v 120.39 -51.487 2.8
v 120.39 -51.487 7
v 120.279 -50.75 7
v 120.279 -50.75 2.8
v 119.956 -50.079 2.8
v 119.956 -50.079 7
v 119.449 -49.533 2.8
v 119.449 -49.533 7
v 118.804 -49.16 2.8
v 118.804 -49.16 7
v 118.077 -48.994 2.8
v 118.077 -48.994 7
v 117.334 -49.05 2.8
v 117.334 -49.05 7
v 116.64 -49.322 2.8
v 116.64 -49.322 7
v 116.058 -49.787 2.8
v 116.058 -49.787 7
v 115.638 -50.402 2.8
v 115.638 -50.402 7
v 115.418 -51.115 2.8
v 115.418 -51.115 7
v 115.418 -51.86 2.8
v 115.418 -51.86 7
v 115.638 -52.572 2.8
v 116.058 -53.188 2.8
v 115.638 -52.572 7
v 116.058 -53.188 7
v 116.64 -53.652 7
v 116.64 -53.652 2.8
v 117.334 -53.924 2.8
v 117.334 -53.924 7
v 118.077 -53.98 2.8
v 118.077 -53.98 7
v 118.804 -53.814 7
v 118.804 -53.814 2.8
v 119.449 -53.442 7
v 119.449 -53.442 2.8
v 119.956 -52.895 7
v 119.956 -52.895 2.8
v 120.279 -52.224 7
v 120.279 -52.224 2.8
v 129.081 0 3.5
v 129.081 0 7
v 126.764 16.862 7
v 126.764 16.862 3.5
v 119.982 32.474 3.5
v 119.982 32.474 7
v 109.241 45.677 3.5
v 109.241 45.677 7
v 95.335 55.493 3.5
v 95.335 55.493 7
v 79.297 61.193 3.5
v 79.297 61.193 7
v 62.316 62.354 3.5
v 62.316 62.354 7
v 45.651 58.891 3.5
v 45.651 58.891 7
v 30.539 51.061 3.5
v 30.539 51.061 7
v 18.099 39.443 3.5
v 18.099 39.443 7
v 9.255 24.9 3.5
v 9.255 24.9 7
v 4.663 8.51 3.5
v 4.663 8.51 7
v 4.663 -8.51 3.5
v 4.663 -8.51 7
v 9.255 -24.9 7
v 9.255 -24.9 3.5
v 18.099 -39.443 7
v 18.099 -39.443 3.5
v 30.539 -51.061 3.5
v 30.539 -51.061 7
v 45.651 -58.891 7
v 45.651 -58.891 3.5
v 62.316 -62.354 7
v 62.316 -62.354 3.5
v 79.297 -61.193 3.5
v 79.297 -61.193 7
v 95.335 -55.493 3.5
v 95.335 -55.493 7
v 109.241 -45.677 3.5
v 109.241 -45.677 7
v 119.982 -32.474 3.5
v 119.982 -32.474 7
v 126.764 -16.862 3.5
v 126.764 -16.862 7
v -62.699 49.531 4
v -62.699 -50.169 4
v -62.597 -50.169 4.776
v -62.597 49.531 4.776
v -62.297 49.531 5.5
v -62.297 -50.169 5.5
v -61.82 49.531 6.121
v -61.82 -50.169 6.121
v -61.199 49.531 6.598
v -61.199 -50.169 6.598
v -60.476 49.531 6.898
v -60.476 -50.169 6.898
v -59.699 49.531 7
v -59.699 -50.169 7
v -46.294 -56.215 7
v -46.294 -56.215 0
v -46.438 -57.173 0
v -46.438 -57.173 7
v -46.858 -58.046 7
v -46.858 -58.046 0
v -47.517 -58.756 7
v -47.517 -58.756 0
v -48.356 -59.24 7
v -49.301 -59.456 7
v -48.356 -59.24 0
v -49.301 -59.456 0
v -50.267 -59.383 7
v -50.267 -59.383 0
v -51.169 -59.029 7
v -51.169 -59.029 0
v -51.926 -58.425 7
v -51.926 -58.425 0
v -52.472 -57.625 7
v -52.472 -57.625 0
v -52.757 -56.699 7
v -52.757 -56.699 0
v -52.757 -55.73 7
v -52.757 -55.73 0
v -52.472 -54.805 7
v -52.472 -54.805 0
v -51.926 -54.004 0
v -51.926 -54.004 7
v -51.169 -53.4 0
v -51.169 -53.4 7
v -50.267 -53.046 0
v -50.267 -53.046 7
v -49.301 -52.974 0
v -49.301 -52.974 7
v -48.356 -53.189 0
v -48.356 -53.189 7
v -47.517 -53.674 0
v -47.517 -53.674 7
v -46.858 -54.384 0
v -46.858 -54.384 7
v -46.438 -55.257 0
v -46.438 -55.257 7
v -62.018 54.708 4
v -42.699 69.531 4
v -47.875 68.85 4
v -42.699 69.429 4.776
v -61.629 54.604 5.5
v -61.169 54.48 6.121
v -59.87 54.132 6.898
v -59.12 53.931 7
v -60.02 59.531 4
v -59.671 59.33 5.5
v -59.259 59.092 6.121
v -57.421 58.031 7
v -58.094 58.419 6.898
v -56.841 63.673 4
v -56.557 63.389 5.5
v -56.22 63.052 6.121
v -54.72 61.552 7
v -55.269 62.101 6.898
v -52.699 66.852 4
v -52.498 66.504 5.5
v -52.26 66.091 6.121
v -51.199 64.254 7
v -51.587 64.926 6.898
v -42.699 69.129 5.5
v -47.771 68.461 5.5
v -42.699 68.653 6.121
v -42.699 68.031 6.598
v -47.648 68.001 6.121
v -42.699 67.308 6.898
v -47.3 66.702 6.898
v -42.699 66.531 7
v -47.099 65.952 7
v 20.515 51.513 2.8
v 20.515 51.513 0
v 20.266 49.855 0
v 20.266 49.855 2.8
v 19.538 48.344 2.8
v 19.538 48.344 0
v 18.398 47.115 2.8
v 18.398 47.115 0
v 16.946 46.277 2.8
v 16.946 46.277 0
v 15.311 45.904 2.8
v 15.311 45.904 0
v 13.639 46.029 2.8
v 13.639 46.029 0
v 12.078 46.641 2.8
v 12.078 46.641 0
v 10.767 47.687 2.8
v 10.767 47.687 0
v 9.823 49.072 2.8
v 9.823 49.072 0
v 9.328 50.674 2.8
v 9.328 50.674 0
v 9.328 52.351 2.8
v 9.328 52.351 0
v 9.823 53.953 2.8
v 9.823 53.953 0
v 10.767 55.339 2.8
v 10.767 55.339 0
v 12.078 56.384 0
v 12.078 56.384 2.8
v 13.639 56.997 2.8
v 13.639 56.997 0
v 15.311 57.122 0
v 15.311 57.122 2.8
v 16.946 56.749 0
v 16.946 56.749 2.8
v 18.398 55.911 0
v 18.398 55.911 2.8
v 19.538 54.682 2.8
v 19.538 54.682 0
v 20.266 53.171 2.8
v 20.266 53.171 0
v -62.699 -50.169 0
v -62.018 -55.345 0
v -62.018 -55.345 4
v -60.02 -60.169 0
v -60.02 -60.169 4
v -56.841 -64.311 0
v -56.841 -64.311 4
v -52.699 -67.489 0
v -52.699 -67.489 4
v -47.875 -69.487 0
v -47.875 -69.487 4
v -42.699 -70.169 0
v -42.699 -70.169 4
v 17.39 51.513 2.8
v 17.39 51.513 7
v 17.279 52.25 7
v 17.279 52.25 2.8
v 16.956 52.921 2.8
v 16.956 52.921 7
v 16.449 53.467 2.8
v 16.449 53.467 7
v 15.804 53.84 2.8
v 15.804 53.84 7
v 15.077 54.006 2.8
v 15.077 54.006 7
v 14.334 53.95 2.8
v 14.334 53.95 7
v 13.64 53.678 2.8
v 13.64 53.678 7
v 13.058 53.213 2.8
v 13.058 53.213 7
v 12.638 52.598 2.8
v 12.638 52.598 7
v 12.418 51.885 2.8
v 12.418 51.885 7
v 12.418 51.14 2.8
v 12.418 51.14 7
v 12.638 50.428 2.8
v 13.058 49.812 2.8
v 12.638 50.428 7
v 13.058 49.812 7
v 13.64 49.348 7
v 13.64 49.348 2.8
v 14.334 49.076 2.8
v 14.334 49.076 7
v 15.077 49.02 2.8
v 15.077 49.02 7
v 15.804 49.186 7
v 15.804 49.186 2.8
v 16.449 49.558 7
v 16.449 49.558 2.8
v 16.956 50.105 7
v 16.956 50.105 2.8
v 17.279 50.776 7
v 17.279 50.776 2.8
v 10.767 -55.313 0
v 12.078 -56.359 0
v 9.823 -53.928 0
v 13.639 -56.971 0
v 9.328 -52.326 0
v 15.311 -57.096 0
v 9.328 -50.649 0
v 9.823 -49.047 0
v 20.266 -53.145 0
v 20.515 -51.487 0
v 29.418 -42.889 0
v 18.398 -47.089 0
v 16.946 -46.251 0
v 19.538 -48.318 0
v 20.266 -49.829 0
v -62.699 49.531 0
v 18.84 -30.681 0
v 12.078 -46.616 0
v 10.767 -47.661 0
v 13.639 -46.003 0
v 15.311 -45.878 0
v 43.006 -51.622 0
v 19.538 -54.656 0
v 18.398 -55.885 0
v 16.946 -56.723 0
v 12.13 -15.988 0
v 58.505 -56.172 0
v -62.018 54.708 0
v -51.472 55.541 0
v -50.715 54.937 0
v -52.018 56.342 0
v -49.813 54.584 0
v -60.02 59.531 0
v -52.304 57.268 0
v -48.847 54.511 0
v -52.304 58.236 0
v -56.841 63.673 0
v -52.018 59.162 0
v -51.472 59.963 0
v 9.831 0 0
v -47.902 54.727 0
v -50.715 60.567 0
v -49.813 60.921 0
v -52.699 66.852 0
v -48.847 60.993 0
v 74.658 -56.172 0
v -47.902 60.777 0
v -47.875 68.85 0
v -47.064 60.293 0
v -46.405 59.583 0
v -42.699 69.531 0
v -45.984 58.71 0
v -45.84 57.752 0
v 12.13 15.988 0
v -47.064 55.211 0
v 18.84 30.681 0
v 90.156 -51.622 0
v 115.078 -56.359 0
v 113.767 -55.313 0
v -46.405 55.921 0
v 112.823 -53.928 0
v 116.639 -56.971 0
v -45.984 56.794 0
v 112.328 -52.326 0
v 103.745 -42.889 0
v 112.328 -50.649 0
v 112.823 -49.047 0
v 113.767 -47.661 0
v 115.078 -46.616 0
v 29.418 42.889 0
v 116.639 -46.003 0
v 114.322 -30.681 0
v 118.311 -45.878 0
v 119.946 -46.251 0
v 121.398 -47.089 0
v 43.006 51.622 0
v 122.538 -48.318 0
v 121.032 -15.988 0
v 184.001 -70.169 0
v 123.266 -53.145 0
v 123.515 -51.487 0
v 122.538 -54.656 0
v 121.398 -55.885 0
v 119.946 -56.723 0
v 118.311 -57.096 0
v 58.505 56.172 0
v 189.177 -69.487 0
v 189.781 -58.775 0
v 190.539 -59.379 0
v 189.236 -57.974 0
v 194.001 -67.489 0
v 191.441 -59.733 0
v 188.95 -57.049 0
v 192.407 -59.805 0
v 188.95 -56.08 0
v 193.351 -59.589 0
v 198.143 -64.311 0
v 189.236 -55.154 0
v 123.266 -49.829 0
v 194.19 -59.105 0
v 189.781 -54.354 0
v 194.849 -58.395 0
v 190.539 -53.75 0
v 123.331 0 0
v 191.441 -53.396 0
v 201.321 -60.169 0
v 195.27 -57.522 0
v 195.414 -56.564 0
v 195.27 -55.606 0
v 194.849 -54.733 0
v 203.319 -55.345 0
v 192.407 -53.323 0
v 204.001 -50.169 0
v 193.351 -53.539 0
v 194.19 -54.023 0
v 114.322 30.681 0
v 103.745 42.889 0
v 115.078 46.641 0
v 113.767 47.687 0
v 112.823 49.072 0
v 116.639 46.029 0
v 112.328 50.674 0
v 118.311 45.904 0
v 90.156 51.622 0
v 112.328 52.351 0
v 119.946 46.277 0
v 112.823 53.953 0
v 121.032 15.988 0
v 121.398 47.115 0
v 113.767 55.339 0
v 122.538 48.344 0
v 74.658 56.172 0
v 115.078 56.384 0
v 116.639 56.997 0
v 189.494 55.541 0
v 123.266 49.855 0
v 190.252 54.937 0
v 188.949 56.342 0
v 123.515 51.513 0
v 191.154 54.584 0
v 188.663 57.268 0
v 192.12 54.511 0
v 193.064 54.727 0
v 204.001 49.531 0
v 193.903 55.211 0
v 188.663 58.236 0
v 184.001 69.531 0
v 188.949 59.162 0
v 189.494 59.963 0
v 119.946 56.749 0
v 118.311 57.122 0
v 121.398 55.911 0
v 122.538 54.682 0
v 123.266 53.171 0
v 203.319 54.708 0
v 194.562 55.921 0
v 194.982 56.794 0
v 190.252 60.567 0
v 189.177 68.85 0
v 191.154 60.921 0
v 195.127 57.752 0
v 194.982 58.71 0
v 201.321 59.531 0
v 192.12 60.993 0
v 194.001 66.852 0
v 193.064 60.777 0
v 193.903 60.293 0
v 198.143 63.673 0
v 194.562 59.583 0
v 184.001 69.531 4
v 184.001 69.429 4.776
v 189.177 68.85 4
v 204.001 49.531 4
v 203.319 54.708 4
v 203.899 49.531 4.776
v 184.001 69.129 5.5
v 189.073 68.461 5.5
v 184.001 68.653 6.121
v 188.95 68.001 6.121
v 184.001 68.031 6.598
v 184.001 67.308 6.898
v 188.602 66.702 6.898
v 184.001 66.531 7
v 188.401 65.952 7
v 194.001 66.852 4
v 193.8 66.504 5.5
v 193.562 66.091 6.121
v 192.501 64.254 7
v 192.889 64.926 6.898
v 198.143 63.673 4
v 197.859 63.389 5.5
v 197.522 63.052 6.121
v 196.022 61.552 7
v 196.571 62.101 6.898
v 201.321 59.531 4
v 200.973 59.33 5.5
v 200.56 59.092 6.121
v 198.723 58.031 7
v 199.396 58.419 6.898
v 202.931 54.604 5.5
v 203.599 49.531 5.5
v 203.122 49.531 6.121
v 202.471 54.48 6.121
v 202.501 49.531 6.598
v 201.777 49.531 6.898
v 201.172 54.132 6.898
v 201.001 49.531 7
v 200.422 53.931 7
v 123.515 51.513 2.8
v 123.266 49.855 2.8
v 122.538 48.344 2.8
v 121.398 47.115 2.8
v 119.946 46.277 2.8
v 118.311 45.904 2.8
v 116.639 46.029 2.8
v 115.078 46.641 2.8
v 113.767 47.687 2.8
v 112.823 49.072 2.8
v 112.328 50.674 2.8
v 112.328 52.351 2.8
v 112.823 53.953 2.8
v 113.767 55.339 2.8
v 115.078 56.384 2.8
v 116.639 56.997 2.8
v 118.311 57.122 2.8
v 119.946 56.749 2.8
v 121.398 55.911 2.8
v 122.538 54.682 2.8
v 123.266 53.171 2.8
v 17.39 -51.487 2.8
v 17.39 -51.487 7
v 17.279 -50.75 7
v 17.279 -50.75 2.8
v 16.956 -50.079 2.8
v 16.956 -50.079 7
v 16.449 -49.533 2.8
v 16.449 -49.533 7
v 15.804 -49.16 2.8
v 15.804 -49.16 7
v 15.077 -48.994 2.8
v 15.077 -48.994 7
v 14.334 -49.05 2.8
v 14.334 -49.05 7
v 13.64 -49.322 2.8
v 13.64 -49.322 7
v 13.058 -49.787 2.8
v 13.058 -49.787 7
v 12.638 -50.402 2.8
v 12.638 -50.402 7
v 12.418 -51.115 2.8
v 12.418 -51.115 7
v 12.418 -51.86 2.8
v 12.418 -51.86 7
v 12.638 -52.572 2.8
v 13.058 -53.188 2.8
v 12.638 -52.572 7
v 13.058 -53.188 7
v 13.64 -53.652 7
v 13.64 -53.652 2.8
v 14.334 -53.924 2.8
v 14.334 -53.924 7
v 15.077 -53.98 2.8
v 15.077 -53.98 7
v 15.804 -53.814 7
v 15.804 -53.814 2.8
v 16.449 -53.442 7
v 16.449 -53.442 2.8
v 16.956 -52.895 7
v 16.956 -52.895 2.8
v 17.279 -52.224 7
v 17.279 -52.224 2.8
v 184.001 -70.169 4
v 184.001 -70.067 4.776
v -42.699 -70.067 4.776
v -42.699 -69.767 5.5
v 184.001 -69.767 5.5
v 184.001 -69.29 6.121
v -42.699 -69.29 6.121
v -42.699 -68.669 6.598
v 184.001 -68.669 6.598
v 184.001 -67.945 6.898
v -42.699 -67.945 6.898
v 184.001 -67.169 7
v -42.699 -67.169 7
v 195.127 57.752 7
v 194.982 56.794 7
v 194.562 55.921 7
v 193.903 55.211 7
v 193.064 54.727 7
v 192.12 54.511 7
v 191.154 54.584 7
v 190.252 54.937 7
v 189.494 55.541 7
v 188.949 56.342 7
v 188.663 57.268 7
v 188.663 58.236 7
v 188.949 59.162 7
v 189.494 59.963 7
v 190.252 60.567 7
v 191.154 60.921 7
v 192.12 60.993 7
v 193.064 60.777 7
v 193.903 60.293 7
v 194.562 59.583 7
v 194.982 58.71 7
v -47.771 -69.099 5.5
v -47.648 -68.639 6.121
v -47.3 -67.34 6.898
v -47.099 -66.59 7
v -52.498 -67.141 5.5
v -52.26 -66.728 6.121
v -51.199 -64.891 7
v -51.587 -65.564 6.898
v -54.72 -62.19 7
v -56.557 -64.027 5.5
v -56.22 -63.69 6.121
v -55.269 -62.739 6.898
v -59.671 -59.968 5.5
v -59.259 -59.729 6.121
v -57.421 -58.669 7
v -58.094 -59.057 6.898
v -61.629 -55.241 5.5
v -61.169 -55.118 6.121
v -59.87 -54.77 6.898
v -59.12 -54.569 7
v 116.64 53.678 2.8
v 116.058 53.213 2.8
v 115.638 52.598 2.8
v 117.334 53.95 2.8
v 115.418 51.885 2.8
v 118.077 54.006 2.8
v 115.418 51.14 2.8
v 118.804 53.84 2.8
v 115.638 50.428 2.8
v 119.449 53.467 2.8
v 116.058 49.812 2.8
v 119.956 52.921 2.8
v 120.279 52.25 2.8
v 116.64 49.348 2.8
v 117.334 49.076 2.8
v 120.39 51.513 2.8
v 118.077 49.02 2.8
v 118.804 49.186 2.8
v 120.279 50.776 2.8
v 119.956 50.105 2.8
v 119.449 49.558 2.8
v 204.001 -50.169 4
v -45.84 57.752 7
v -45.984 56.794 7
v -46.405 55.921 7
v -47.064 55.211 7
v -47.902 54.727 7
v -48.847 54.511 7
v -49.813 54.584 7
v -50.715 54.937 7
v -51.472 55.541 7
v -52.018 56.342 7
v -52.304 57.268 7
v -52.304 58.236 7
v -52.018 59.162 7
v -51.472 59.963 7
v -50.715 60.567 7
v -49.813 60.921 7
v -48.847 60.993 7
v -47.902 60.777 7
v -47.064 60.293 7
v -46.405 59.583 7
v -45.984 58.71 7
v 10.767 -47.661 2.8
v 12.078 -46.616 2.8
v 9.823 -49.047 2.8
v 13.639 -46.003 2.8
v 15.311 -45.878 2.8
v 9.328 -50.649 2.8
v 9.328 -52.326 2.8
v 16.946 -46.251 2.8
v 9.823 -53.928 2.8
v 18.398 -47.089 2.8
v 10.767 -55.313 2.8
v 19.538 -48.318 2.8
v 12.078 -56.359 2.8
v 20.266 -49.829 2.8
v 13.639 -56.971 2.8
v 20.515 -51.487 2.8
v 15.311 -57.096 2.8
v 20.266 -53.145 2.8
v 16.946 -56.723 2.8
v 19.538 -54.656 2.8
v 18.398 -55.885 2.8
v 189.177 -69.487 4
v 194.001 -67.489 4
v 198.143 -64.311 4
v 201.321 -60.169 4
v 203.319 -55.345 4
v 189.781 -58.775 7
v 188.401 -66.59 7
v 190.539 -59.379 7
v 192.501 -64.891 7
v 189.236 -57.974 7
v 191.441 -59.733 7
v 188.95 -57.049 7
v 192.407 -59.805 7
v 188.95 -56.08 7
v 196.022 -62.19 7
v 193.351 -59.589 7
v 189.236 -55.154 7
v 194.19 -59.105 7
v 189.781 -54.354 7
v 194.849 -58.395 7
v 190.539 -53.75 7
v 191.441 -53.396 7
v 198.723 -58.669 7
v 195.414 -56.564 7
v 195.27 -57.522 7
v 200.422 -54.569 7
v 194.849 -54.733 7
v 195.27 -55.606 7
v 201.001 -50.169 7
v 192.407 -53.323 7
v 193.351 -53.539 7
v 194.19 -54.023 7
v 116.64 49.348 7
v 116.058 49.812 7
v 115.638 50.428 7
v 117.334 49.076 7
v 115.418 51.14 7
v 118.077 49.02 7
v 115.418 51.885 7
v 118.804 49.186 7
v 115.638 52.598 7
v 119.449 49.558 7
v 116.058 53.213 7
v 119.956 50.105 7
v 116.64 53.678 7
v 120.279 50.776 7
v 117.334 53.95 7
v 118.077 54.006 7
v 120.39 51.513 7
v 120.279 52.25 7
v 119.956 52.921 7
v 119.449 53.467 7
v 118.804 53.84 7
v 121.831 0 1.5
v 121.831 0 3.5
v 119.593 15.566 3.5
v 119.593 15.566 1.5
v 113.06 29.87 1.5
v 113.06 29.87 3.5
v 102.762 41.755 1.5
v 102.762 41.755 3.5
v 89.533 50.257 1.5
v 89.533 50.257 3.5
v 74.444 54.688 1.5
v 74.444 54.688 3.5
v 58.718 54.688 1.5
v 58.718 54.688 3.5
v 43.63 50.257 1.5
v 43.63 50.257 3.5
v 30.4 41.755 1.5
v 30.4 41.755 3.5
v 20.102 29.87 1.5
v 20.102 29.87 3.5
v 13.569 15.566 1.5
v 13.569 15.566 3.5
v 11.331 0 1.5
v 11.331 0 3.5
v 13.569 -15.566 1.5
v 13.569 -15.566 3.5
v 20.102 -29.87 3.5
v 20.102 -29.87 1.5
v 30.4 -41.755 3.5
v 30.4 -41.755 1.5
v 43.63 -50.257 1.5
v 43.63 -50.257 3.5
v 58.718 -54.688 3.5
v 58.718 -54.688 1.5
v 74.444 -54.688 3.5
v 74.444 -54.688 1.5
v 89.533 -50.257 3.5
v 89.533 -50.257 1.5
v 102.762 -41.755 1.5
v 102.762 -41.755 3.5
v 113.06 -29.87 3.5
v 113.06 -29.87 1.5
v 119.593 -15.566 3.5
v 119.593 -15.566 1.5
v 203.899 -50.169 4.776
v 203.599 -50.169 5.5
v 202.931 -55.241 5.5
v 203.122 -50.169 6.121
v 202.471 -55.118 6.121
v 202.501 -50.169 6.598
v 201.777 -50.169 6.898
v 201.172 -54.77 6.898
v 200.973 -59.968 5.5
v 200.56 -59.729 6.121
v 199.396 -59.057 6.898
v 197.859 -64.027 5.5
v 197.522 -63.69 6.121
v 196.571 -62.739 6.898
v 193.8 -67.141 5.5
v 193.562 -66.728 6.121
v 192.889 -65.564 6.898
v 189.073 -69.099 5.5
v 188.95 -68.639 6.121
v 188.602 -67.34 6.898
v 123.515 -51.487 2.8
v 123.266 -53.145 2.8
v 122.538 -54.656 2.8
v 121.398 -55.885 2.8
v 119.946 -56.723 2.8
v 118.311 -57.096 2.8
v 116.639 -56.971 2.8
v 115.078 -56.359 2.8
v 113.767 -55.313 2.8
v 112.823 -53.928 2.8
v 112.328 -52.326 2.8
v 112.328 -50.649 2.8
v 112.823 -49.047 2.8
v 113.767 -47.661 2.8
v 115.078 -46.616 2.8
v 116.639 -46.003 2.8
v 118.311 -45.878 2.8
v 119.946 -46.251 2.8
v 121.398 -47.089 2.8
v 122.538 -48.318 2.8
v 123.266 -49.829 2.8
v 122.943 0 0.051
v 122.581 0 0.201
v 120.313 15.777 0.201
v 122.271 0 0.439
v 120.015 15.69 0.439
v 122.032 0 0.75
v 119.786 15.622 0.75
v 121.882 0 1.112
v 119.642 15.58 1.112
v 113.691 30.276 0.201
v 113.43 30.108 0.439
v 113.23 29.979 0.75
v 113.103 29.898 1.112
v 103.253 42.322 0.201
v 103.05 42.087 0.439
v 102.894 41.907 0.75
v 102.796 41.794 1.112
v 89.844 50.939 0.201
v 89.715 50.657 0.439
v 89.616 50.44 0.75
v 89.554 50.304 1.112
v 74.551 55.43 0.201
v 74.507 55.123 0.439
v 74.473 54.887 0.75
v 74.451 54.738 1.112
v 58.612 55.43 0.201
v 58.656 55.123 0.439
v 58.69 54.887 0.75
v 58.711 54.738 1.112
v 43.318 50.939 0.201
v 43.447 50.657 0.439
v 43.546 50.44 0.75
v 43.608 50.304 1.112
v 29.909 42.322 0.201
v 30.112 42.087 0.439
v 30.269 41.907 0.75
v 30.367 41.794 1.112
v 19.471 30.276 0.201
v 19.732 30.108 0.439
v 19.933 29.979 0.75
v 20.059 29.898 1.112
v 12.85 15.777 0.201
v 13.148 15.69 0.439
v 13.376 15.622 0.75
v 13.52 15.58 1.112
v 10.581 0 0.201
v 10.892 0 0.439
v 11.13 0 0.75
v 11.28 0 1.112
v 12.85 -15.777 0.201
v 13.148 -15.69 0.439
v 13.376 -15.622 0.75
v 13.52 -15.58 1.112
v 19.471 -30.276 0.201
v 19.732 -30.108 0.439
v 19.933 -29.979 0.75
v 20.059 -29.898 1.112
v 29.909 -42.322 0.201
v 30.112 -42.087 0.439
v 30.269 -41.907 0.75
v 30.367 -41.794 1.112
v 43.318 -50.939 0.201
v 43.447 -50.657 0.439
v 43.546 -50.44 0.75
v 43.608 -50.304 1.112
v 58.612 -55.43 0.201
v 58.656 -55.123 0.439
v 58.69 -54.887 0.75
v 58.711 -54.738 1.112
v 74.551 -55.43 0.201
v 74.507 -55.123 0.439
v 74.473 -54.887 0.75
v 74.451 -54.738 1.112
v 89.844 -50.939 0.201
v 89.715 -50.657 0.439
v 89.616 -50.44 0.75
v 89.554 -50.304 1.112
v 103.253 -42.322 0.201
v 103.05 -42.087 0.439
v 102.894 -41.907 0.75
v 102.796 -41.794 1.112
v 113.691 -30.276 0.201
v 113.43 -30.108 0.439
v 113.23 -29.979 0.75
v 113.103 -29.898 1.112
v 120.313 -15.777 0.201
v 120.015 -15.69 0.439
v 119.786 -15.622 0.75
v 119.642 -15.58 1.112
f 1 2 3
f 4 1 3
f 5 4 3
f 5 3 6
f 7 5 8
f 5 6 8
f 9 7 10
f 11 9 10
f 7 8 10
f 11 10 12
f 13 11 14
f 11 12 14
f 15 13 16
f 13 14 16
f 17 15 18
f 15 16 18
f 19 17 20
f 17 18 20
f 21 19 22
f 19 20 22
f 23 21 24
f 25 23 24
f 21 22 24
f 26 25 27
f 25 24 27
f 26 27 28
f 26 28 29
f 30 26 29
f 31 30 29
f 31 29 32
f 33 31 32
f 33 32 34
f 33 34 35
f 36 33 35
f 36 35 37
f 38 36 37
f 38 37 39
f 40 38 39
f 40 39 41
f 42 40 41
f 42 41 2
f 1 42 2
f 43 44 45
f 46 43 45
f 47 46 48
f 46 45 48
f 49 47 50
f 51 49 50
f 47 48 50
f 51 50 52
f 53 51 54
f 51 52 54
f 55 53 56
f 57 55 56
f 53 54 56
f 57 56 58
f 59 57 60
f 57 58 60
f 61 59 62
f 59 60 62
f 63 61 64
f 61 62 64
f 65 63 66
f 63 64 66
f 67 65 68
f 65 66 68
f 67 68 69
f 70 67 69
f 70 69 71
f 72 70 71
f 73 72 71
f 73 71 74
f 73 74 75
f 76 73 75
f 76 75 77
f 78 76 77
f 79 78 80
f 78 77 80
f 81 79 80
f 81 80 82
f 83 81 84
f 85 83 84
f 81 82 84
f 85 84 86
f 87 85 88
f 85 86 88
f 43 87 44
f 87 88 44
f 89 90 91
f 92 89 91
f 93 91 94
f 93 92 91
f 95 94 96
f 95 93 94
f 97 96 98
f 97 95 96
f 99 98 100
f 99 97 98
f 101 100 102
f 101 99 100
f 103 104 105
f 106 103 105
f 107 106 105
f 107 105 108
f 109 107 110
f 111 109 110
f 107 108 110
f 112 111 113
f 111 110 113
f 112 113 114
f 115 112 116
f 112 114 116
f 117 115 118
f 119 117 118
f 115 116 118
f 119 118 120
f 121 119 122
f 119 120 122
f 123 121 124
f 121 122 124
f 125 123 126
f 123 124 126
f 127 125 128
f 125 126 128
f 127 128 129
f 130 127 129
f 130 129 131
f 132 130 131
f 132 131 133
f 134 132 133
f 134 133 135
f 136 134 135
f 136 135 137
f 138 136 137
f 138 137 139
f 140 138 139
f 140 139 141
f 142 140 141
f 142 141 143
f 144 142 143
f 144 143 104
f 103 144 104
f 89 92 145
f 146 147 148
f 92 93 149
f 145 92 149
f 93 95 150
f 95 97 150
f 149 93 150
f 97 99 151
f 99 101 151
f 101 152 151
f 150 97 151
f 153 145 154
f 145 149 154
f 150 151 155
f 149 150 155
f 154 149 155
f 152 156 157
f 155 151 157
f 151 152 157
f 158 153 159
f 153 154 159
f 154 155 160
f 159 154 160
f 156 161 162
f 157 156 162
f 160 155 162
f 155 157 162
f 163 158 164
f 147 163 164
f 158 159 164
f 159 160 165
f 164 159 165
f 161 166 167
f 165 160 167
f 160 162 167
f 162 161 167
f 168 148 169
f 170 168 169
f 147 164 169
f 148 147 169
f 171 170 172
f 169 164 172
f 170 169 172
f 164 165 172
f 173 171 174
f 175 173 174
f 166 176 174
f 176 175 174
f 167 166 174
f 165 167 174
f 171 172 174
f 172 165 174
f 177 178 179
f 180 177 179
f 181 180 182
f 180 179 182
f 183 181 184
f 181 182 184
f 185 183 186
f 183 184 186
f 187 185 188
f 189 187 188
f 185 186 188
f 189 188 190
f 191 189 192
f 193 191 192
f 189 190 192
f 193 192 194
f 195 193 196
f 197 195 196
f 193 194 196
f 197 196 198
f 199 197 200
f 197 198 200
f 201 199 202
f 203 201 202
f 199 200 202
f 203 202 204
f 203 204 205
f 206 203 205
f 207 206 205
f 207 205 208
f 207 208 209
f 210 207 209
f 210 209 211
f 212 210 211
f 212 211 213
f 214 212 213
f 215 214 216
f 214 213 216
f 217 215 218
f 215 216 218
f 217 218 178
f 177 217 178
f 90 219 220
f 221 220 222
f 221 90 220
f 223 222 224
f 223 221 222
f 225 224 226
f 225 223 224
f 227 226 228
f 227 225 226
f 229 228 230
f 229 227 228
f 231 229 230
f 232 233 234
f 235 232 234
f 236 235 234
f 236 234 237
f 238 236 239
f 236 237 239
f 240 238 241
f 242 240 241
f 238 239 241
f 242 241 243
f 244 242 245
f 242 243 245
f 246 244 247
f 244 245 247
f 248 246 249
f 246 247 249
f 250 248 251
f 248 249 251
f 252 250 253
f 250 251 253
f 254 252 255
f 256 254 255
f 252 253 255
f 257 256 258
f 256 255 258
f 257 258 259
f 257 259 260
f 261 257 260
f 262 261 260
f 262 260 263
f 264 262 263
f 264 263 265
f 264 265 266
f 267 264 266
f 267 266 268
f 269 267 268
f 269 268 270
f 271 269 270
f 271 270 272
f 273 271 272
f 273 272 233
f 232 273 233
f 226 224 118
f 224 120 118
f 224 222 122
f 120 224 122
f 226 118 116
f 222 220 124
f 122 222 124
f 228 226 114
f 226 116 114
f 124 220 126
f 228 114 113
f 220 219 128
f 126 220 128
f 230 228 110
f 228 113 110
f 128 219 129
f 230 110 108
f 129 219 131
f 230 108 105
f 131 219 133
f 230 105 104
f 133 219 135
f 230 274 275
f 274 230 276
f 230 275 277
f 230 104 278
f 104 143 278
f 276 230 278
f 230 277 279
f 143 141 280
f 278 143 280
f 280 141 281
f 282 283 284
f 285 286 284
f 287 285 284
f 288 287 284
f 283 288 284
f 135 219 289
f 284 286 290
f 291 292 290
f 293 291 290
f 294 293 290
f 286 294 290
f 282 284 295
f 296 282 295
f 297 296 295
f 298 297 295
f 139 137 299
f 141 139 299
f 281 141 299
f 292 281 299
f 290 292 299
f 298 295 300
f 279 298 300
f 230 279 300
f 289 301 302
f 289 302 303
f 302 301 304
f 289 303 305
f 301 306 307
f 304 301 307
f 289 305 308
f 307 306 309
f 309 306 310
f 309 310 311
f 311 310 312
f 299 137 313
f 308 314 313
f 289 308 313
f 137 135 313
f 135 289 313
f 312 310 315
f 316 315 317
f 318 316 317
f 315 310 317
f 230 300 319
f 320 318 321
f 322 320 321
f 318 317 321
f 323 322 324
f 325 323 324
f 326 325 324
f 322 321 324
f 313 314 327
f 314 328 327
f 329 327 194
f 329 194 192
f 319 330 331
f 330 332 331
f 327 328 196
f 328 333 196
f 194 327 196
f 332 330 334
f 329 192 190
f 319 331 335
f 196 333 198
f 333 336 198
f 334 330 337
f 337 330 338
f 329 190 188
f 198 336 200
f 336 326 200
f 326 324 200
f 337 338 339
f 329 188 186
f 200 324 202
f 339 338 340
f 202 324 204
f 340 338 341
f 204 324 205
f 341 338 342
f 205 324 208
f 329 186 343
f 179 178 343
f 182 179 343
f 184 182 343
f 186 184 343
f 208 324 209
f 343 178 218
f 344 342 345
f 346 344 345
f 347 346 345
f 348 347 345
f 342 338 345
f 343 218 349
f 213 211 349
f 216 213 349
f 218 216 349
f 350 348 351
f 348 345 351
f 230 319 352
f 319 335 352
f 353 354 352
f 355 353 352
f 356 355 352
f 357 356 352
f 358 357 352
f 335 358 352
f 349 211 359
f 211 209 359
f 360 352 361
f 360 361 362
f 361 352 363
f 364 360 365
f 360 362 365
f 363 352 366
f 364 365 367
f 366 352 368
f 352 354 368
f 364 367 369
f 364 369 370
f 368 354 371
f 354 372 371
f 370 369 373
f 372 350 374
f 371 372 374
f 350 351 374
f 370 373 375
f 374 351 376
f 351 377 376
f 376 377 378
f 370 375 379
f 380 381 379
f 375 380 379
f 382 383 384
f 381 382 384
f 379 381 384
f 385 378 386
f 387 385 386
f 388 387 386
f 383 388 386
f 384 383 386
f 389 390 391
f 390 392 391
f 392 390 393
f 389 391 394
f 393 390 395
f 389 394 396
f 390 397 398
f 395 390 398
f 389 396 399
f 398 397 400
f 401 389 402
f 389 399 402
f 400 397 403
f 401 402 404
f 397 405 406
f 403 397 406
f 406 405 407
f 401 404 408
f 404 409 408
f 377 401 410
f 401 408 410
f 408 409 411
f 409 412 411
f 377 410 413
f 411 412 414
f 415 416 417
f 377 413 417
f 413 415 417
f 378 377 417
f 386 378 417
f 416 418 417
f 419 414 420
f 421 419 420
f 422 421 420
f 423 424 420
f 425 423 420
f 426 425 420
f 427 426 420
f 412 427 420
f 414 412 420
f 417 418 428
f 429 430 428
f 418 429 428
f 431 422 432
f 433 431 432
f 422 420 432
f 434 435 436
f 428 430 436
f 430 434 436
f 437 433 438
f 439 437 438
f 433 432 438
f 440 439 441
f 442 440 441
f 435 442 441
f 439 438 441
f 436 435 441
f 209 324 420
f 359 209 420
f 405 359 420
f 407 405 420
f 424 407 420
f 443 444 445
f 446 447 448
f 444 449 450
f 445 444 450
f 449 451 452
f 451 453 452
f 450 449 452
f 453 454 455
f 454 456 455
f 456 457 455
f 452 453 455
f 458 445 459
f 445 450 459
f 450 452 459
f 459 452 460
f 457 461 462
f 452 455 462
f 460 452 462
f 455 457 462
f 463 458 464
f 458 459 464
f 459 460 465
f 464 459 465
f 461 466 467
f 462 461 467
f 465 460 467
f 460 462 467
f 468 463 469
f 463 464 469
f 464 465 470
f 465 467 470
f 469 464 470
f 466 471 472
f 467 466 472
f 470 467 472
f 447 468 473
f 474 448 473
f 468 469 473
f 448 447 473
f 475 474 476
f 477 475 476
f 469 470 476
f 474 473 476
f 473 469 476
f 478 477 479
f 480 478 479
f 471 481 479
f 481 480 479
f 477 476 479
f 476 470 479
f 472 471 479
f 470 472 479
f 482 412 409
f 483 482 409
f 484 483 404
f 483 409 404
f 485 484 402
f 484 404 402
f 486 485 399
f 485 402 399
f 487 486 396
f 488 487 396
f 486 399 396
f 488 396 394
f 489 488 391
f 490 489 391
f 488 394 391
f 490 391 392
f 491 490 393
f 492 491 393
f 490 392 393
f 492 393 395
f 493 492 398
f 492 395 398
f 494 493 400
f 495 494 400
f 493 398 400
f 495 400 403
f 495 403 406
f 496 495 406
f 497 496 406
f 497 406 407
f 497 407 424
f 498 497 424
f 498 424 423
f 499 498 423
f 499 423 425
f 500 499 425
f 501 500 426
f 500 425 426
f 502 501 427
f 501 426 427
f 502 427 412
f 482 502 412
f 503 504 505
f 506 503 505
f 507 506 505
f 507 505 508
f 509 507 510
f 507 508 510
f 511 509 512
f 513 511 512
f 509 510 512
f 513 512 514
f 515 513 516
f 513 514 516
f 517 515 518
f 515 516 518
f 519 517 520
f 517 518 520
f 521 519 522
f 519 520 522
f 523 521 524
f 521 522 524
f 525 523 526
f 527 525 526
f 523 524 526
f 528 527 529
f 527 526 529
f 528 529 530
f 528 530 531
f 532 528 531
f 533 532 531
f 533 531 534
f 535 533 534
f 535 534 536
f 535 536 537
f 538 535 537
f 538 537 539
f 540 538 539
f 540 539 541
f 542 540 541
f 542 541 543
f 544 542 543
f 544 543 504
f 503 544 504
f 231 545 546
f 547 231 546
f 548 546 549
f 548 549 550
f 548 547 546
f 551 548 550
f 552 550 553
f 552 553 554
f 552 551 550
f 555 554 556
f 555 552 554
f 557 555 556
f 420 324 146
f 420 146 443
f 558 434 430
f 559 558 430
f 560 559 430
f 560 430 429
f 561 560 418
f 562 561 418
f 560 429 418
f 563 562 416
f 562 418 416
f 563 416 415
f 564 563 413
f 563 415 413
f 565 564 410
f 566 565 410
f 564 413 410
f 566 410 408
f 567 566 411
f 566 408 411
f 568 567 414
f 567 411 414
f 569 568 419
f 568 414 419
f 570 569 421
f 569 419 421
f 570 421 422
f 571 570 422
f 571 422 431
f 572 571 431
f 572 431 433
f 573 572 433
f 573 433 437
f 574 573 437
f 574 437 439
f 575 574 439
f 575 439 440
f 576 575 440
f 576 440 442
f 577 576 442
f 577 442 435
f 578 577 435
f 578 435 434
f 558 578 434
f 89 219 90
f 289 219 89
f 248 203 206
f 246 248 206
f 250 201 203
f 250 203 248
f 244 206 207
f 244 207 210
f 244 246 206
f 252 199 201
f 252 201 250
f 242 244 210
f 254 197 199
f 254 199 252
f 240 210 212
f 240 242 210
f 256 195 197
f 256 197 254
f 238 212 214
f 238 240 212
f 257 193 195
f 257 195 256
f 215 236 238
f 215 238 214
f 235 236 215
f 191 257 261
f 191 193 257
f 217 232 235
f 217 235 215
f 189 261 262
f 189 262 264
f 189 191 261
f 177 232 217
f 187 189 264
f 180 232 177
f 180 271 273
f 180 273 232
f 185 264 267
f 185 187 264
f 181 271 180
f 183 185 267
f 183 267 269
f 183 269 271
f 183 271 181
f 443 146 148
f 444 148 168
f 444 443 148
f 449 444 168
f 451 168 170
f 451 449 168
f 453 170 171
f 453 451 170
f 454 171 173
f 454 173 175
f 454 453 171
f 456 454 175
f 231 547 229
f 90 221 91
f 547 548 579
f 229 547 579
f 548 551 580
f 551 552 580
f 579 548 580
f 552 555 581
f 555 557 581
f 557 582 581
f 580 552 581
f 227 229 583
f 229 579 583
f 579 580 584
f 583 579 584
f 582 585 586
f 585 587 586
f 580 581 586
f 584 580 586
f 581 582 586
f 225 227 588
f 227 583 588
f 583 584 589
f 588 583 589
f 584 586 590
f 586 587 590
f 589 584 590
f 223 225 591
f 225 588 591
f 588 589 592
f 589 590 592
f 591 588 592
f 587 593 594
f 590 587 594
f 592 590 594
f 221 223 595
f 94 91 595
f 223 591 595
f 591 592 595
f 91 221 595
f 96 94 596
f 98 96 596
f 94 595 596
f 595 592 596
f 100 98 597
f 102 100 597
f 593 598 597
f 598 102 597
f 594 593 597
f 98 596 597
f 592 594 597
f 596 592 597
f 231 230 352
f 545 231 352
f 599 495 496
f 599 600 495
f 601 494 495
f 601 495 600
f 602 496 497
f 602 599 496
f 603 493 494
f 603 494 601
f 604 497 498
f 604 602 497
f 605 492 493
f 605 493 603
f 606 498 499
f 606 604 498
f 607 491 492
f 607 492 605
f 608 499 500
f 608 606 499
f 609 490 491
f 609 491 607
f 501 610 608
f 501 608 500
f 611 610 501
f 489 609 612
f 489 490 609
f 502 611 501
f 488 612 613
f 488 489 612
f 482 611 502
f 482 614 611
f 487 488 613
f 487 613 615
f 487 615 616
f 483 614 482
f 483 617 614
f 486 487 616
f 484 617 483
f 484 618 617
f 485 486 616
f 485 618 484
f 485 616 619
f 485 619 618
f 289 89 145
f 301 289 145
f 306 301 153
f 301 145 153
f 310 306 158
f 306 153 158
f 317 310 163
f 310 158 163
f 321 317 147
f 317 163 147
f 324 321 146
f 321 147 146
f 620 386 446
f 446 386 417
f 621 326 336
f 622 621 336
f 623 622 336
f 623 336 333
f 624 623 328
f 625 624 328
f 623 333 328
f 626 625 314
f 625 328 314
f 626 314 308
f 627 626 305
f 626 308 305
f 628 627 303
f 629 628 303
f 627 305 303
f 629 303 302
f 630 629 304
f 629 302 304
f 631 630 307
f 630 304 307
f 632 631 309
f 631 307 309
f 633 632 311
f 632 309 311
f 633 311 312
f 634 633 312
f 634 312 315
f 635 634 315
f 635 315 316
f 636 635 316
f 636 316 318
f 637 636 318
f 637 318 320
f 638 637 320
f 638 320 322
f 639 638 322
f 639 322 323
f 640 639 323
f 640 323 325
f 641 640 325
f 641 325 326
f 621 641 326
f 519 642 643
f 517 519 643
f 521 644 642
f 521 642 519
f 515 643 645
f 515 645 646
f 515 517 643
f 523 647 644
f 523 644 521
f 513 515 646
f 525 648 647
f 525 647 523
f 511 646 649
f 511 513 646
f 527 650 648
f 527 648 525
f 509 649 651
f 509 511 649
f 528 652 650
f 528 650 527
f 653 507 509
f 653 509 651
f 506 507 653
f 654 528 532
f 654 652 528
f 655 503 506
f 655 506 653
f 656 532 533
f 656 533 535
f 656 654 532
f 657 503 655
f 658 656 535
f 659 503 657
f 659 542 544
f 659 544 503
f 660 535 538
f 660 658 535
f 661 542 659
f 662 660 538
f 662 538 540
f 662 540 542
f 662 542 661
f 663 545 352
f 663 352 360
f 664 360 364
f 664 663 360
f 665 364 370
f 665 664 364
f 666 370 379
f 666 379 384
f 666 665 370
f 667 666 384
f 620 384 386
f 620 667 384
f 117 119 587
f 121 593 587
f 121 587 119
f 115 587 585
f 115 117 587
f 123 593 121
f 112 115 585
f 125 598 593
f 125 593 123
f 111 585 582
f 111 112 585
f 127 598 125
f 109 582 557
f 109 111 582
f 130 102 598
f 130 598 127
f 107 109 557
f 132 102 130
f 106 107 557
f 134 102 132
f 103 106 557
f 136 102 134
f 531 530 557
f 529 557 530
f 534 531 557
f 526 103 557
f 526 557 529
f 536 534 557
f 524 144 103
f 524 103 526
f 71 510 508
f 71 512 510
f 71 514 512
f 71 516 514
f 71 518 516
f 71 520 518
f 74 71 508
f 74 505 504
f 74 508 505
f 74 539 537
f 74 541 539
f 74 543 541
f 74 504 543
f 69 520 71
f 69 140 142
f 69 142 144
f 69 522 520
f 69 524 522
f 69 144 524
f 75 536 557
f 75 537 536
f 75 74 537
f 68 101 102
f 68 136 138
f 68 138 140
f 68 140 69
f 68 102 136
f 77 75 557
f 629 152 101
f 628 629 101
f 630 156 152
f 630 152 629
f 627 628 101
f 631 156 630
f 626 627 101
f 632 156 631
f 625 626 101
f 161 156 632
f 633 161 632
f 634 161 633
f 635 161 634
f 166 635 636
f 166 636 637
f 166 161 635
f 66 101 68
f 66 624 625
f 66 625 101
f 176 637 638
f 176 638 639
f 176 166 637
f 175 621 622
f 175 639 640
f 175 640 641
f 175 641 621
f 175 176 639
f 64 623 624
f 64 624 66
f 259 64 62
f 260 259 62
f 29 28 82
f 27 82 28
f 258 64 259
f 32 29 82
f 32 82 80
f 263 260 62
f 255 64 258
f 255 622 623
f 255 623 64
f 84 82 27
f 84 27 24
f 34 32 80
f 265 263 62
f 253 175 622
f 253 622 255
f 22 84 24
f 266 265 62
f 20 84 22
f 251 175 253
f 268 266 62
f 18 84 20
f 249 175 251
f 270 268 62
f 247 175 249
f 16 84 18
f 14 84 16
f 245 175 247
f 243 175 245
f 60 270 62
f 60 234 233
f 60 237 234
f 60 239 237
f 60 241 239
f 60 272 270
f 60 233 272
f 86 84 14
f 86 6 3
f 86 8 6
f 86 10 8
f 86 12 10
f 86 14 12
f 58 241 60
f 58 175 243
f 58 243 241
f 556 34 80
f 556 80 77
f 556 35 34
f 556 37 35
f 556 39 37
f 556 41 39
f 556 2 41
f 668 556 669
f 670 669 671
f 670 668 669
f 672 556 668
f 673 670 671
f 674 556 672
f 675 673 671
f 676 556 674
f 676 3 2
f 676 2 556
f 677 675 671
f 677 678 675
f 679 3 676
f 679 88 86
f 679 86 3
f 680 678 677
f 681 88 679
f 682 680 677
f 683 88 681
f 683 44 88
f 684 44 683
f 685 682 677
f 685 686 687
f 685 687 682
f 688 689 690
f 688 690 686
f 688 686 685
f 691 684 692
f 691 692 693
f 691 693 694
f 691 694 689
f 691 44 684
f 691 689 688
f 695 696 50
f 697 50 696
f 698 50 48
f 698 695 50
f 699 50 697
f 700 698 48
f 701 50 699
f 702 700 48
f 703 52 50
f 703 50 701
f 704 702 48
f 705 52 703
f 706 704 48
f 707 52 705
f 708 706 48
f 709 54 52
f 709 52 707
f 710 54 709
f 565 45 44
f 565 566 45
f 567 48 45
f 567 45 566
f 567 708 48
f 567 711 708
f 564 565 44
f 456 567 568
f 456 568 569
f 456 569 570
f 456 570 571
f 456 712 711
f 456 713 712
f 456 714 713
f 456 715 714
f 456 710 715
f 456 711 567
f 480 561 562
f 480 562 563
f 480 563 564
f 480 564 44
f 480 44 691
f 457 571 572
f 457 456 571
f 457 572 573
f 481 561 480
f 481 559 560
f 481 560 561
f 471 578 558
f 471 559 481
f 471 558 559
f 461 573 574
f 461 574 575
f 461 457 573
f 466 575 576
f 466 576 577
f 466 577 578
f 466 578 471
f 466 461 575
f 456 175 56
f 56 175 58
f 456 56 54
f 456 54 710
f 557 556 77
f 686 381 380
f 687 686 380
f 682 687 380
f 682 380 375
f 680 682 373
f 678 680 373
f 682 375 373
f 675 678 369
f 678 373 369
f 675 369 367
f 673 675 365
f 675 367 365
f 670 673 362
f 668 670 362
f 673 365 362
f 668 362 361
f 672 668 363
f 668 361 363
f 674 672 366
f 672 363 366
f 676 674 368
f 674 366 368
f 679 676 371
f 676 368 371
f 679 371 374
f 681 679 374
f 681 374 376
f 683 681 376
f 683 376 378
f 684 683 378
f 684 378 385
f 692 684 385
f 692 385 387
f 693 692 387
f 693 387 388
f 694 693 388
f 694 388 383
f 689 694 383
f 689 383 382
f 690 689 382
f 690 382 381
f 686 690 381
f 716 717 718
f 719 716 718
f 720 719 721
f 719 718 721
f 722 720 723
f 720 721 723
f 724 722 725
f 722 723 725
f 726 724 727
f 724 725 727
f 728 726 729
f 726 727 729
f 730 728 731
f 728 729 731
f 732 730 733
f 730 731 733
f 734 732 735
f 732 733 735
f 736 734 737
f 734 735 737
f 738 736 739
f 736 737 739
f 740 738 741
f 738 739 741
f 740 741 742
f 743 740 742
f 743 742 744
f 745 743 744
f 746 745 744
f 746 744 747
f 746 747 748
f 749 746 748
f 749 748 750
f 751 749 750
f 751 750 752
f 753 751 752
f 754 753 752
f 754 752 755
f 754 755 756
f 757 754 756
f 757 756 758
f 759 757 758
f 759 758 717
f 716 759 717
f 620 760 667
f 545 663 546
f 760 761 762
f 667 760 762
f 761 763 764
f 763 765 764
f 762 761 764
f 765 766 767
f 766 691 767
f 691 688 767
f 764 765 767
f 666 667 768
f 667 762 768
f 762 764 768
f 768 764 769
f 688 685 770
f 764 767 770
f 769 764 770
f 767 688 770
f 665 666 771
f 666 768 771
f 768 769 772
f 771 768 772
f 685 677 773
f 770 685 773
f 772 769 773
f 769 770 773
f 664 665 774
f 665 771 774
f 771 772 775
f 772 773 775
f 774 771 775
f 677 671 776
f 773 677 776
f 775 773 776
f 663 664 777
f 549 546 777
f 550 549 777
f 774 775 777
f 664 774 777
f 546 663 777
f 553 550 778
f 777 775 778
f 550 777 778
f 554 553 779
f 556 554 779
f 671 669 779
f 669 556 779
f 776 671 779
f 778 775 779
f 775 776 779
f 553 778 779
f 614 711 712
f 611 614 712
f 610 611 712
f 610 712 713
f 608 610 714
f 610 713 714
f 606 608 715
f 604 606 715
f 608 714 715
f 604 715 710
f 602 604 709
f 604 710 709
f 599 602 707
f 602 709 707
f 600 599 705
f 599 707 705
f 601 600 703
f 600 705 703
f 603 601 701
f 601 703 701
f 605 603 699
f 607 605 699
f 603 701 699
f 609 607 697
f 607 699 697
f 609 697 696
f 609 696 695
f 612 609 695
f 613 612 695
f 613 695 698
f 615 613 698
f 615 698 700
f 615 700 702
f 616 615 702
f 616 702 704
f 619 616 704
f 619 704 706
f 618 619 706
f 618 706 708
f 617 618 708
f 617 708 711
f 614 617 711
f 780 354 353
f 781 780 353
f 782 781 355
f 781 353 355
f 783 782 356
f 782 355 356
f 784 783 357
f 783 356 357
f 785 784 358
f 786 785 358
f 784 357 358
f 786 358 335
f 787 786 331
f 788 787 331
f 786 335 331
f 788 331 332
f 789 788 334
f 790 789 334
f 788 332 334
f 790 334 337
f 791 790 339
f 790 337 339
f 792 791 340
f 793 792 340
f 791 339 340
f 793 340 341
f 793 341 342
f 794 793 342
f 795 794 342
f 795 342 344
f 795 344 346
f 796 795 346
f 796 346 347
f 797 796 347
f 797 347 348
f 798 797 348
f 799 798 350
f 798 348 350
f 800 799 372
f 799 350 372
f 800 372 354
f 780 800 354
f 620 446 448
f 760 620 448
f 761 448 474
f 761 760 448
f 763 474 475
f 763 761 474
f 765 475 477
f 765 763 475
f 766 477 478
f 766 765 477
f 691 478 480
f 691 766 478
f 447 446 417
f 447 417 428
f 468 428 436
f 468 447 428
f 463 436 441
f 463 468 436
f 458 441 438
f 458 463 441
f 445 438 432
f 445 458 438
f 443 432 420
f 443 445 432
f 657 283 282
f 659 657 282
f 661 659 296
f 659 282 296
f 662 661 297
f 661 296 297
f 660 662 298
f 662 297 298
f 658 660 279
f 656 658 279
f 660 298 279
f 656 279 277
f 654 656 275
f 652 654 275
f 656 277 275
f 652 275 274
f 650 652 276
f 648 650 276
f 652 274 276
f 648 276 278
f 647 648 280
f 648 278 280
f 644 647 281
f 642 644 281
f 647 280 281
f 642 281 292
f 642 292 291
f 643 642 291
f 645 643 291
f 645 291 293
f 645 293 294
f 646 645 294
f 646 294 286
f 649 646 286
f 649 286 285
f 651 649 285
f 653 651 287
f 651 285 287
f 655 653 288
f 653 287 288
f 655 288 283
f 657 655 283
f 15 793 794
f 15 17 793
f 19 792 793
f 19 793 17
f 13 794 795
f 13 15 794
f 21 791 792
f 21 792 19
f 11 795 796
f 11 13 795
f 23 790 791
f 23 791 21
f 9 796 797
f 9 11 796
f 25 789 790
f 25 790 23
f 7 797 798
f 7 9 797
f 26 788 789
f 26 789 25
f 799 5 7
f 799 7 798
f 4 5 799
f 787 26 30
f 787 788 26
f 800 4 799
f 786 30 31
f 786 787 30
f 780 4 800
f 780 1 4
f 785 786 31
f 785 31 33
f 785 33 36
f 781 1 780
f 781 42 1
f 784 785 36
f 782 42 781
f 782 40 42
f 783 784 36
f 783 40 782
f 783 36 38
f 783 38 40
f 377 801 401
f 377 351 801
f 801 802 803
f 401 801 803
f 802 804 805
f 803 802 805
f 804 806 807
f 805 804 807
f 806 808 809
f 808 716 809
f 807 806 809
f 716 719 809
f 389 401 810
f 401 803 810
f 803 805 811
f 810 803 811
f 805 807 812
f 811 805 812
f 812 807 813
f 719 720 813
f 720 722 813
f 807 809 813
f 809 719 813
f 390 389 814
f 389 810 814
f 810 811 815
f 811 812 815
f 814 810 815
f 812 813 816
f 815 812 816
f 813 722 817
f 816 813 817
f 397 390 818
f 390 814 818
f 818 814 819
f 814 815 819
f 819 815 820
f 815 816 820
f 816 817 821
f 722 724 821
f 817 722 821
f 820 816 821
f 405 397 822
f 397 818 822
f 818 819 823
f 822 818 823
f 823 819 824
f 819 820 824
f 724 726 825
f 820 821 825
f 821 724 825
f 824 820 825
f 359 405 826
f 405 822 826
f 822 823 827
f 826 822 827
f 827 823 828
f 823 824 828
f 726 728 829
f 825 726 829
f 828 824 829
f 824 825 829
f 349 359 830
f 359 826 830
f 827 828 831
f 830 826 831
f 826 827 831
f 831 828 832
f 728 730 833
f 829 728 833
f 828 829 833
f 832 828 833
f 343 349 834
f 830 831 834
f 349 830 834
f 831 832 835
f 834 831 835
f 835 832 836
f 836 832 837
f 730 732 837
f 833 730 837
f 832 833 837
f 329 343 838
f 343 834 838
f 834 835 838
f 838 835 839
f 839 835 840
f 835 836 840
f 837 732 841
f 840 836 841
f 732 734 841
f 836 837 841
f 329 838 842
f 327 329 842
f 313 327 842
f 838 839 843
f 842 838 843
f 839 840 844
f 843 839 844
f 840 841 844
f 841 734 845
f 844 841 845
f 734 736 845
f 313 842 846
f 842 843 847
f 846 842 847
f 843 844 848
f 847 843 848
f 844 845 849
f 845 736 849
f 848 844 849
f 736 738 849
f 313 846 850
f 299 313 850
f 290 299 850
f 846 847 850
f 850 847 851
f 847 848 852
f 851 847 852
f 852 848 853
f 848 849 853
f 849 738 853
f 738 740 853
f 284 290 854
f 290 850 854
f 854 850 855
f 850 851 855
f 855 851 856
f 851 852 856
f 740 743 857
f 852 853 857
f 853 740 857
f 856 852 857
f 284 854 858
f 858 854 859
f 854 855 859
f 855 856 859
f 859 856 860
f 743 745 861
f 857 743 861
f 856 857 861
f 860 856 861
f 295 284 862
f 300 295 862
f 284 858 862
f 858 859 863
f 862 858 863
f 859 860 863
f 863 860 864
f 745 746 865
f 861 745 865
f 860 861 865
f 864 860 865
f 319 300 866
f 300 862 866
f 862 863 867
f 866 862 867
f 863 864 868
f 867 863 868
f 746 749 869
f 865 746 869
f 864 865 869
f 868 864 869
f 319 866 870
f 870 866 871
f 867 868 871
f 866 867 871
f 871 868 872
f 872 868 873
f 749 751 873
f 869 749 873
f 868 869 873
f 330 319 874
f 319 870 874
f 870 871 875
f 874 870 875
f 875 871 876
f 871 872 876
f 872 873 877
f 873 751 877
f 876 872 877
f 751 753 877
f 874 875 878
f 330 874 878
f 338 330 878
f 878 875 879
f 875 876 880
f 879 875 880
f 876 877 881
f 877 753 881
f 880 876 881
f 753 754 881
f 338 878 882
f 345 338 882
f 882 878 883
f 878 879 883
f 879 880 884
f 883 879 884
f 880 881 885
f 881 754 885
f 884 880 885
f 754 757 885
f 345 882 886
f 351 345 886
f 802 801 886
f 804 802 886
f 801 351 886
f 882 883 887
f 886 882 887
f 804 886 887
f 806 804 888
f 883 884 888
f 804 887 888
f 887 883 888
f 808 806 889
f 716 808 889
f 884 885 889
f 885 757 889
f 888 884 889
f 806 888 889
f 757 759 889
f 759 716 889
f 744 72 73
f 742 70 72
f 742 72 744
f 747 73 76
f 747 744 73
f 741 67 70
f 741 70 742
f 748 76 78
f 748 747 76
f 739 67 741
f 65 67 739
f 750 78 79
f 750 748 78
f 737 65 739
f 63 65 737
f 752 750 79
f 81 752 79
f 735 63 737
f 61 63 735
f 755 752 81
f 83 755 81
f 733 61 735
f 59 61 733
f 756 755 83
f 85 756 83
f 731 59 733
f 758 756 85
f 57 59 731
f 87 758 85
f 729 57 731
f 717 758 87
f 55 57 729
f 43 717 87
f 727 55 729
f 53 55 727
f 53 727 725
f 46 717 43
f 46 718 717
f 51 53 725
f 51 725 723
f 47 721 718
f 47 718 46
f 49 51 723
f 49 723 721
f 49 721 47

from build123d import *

# Parameters (mm, degrees)
F0_W      = 266.7
F0_H      = 139.7
F1_DEPTH  = 7
F2_R      = 20
F3_R      = 62.5
F3_R_2    = 55.25
F4_DEPTH  = 3.5
F5_DEPTH  = 10
F6_R      = 3.25
F7_DEPTH  = 8
F8_R      = 2.5
F9_DEPTH  = 8
F10_R     = 5.625
F11_DEPTH = 2.8
F12_R     = 1.5
F13_R     = 3


with BuildPart() as f1:
    # F0 (on Top) → F1 (new body)
    with BuildSketch(Plane.XY):
        with Locations((70.65095, -0.318812)):
            Rectangle(F0_W, F0_H)
    extrude(amount=F1_DEPTH)

    # F2
    f2_edges = [f1.edges().sort_by_distance(p)[0] for p in [
        (-62.69905, 69.531188, 3.5),
        (204.00095, 69.531188, 3.5),
        (-62.69905, -70.168812, 3.5),
        (204.00095, -70.168812, 3.5),
    ]]
    fillet(f2_edges, radius=F2_R)

    # F3 (on face) → F4 (cut)
    with BuildSketch(Plane.XY.offset(7)):
        with Locations((66.581185, 0)):
            Circle(F3_R)
        with Locations((66.581185, 0)):
            Circle(F3_R_2, mode=Mode.SUBTRACT)
    extrude(amount=-F4_DEPTH, mode=Mode.SUBTRACT)

    # F3 (on face) → F5 (cut)
    with BuildSketch(Plane.XY.offset(7)):
        with Locations((66.581185, 0)):
            Circle(F3_R_2)
    extrude(amount=-F5_DEPTH, mode=Mode.SUBTRACT)

    # F6 (on face) → F7 (cut)
    with BuildSketch(Plane(origin=(0, 0, 0), x_dir=(1, 0, 0), z_dir=(0, 0, -1))):
        with Locations((-49.543765, 56.214787)):
            Circle(F6_R)
        with Locations((192.163914, 56.564152)):
            Circle(F6_R)
        with Locations((191.876724, -57.752054)):
            Circle(F6_R)
        with Locations((-49.089845, -57.752058)):
            Circle(F6_R)
    extrude(amount=-F7_DEPTH, mode=Mode.SUBTRACT)

    # F8 (on face) → F9 (cut)
    with BuildSketch(Plane.XY.offset(7)):
        with Locations((14.890482, 51.512826)):
            Circle(F8_R)
        with Locations((117.890482, 51.512826)):
            Circle(F8_R)
        with Locations((117.890482, -51.487174)):
            Circle(F8_R)
        with Locations((14.890482, -51.487174)):
            Circle(F8_R)
    extrude(amount=-F9_DEPTH, mode=Mode.SUBTRACT)

    # F10 (on face) → F11 (cut)
    with BuildSketch(Plane(origin=(0, 0, 0), x_dir=(1, 0, 0), z_dir=(0, 0, -1))):
        with Locations((14.890482, 51.487174)):
            Circle(F10_R)
        with Locations((117.890482, 51.487174)):
            Circle(F10_R)
        with Locations((117.890482, -51.512826)):
            Circle(F10_R)
        with Locations((14.890482, -51.512826)):
            Circle(F10_R)
    extrude(amount=-F11_DEPTH, mode=Mode.SUBTRACT)

    # F12
    f12_edges = [f1.edges().sort_by_distance(p)[0] for p in [
        (11.331185, 0, 0),
    ]]
    fillet(f12_edges, radius=F12_R)

    # F13
    f13_edges = [f1.edges().sort_by_distance(p)[0] for p in [
        (70.65095, 69.531188, 7),
    ]]
    fillet(f13_edges, radius=F13_R)


solid = f1.part
